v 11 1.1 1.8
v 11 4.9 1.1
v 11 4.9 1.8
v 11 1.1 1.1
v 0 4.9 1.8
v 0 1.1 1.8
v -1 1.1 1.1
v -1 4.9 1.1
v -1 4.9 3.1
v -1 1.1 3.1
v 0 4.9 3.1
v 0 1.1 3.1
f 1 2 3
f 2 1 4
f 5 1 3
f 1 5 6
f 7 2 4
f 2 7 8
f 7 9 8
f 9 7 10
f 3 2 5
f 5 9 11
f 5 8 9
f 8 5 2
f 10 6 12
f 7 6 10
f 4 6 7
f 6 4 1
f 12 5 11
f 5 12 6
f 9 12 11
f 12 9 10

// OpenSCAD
module outer_box(){
 	cube([6,6,1]);
 
 	translate([0,0,1])
 		cube([6,1,2]);
 
 	translate([0,5,1])
 		cube([6,1,2]);
 
 	translate([2,1,2])
 		cube([3,4,1]);
 }
 
 module inner_slide(){
 	color("blue")
 		translate([-1, 1.1, 1.1]){
 			cube([12, 3.8, 0.7]);
 			cube([1, 3.8, 2]);
 	}
 }
 
 % outer_box();
 inner_slide();
